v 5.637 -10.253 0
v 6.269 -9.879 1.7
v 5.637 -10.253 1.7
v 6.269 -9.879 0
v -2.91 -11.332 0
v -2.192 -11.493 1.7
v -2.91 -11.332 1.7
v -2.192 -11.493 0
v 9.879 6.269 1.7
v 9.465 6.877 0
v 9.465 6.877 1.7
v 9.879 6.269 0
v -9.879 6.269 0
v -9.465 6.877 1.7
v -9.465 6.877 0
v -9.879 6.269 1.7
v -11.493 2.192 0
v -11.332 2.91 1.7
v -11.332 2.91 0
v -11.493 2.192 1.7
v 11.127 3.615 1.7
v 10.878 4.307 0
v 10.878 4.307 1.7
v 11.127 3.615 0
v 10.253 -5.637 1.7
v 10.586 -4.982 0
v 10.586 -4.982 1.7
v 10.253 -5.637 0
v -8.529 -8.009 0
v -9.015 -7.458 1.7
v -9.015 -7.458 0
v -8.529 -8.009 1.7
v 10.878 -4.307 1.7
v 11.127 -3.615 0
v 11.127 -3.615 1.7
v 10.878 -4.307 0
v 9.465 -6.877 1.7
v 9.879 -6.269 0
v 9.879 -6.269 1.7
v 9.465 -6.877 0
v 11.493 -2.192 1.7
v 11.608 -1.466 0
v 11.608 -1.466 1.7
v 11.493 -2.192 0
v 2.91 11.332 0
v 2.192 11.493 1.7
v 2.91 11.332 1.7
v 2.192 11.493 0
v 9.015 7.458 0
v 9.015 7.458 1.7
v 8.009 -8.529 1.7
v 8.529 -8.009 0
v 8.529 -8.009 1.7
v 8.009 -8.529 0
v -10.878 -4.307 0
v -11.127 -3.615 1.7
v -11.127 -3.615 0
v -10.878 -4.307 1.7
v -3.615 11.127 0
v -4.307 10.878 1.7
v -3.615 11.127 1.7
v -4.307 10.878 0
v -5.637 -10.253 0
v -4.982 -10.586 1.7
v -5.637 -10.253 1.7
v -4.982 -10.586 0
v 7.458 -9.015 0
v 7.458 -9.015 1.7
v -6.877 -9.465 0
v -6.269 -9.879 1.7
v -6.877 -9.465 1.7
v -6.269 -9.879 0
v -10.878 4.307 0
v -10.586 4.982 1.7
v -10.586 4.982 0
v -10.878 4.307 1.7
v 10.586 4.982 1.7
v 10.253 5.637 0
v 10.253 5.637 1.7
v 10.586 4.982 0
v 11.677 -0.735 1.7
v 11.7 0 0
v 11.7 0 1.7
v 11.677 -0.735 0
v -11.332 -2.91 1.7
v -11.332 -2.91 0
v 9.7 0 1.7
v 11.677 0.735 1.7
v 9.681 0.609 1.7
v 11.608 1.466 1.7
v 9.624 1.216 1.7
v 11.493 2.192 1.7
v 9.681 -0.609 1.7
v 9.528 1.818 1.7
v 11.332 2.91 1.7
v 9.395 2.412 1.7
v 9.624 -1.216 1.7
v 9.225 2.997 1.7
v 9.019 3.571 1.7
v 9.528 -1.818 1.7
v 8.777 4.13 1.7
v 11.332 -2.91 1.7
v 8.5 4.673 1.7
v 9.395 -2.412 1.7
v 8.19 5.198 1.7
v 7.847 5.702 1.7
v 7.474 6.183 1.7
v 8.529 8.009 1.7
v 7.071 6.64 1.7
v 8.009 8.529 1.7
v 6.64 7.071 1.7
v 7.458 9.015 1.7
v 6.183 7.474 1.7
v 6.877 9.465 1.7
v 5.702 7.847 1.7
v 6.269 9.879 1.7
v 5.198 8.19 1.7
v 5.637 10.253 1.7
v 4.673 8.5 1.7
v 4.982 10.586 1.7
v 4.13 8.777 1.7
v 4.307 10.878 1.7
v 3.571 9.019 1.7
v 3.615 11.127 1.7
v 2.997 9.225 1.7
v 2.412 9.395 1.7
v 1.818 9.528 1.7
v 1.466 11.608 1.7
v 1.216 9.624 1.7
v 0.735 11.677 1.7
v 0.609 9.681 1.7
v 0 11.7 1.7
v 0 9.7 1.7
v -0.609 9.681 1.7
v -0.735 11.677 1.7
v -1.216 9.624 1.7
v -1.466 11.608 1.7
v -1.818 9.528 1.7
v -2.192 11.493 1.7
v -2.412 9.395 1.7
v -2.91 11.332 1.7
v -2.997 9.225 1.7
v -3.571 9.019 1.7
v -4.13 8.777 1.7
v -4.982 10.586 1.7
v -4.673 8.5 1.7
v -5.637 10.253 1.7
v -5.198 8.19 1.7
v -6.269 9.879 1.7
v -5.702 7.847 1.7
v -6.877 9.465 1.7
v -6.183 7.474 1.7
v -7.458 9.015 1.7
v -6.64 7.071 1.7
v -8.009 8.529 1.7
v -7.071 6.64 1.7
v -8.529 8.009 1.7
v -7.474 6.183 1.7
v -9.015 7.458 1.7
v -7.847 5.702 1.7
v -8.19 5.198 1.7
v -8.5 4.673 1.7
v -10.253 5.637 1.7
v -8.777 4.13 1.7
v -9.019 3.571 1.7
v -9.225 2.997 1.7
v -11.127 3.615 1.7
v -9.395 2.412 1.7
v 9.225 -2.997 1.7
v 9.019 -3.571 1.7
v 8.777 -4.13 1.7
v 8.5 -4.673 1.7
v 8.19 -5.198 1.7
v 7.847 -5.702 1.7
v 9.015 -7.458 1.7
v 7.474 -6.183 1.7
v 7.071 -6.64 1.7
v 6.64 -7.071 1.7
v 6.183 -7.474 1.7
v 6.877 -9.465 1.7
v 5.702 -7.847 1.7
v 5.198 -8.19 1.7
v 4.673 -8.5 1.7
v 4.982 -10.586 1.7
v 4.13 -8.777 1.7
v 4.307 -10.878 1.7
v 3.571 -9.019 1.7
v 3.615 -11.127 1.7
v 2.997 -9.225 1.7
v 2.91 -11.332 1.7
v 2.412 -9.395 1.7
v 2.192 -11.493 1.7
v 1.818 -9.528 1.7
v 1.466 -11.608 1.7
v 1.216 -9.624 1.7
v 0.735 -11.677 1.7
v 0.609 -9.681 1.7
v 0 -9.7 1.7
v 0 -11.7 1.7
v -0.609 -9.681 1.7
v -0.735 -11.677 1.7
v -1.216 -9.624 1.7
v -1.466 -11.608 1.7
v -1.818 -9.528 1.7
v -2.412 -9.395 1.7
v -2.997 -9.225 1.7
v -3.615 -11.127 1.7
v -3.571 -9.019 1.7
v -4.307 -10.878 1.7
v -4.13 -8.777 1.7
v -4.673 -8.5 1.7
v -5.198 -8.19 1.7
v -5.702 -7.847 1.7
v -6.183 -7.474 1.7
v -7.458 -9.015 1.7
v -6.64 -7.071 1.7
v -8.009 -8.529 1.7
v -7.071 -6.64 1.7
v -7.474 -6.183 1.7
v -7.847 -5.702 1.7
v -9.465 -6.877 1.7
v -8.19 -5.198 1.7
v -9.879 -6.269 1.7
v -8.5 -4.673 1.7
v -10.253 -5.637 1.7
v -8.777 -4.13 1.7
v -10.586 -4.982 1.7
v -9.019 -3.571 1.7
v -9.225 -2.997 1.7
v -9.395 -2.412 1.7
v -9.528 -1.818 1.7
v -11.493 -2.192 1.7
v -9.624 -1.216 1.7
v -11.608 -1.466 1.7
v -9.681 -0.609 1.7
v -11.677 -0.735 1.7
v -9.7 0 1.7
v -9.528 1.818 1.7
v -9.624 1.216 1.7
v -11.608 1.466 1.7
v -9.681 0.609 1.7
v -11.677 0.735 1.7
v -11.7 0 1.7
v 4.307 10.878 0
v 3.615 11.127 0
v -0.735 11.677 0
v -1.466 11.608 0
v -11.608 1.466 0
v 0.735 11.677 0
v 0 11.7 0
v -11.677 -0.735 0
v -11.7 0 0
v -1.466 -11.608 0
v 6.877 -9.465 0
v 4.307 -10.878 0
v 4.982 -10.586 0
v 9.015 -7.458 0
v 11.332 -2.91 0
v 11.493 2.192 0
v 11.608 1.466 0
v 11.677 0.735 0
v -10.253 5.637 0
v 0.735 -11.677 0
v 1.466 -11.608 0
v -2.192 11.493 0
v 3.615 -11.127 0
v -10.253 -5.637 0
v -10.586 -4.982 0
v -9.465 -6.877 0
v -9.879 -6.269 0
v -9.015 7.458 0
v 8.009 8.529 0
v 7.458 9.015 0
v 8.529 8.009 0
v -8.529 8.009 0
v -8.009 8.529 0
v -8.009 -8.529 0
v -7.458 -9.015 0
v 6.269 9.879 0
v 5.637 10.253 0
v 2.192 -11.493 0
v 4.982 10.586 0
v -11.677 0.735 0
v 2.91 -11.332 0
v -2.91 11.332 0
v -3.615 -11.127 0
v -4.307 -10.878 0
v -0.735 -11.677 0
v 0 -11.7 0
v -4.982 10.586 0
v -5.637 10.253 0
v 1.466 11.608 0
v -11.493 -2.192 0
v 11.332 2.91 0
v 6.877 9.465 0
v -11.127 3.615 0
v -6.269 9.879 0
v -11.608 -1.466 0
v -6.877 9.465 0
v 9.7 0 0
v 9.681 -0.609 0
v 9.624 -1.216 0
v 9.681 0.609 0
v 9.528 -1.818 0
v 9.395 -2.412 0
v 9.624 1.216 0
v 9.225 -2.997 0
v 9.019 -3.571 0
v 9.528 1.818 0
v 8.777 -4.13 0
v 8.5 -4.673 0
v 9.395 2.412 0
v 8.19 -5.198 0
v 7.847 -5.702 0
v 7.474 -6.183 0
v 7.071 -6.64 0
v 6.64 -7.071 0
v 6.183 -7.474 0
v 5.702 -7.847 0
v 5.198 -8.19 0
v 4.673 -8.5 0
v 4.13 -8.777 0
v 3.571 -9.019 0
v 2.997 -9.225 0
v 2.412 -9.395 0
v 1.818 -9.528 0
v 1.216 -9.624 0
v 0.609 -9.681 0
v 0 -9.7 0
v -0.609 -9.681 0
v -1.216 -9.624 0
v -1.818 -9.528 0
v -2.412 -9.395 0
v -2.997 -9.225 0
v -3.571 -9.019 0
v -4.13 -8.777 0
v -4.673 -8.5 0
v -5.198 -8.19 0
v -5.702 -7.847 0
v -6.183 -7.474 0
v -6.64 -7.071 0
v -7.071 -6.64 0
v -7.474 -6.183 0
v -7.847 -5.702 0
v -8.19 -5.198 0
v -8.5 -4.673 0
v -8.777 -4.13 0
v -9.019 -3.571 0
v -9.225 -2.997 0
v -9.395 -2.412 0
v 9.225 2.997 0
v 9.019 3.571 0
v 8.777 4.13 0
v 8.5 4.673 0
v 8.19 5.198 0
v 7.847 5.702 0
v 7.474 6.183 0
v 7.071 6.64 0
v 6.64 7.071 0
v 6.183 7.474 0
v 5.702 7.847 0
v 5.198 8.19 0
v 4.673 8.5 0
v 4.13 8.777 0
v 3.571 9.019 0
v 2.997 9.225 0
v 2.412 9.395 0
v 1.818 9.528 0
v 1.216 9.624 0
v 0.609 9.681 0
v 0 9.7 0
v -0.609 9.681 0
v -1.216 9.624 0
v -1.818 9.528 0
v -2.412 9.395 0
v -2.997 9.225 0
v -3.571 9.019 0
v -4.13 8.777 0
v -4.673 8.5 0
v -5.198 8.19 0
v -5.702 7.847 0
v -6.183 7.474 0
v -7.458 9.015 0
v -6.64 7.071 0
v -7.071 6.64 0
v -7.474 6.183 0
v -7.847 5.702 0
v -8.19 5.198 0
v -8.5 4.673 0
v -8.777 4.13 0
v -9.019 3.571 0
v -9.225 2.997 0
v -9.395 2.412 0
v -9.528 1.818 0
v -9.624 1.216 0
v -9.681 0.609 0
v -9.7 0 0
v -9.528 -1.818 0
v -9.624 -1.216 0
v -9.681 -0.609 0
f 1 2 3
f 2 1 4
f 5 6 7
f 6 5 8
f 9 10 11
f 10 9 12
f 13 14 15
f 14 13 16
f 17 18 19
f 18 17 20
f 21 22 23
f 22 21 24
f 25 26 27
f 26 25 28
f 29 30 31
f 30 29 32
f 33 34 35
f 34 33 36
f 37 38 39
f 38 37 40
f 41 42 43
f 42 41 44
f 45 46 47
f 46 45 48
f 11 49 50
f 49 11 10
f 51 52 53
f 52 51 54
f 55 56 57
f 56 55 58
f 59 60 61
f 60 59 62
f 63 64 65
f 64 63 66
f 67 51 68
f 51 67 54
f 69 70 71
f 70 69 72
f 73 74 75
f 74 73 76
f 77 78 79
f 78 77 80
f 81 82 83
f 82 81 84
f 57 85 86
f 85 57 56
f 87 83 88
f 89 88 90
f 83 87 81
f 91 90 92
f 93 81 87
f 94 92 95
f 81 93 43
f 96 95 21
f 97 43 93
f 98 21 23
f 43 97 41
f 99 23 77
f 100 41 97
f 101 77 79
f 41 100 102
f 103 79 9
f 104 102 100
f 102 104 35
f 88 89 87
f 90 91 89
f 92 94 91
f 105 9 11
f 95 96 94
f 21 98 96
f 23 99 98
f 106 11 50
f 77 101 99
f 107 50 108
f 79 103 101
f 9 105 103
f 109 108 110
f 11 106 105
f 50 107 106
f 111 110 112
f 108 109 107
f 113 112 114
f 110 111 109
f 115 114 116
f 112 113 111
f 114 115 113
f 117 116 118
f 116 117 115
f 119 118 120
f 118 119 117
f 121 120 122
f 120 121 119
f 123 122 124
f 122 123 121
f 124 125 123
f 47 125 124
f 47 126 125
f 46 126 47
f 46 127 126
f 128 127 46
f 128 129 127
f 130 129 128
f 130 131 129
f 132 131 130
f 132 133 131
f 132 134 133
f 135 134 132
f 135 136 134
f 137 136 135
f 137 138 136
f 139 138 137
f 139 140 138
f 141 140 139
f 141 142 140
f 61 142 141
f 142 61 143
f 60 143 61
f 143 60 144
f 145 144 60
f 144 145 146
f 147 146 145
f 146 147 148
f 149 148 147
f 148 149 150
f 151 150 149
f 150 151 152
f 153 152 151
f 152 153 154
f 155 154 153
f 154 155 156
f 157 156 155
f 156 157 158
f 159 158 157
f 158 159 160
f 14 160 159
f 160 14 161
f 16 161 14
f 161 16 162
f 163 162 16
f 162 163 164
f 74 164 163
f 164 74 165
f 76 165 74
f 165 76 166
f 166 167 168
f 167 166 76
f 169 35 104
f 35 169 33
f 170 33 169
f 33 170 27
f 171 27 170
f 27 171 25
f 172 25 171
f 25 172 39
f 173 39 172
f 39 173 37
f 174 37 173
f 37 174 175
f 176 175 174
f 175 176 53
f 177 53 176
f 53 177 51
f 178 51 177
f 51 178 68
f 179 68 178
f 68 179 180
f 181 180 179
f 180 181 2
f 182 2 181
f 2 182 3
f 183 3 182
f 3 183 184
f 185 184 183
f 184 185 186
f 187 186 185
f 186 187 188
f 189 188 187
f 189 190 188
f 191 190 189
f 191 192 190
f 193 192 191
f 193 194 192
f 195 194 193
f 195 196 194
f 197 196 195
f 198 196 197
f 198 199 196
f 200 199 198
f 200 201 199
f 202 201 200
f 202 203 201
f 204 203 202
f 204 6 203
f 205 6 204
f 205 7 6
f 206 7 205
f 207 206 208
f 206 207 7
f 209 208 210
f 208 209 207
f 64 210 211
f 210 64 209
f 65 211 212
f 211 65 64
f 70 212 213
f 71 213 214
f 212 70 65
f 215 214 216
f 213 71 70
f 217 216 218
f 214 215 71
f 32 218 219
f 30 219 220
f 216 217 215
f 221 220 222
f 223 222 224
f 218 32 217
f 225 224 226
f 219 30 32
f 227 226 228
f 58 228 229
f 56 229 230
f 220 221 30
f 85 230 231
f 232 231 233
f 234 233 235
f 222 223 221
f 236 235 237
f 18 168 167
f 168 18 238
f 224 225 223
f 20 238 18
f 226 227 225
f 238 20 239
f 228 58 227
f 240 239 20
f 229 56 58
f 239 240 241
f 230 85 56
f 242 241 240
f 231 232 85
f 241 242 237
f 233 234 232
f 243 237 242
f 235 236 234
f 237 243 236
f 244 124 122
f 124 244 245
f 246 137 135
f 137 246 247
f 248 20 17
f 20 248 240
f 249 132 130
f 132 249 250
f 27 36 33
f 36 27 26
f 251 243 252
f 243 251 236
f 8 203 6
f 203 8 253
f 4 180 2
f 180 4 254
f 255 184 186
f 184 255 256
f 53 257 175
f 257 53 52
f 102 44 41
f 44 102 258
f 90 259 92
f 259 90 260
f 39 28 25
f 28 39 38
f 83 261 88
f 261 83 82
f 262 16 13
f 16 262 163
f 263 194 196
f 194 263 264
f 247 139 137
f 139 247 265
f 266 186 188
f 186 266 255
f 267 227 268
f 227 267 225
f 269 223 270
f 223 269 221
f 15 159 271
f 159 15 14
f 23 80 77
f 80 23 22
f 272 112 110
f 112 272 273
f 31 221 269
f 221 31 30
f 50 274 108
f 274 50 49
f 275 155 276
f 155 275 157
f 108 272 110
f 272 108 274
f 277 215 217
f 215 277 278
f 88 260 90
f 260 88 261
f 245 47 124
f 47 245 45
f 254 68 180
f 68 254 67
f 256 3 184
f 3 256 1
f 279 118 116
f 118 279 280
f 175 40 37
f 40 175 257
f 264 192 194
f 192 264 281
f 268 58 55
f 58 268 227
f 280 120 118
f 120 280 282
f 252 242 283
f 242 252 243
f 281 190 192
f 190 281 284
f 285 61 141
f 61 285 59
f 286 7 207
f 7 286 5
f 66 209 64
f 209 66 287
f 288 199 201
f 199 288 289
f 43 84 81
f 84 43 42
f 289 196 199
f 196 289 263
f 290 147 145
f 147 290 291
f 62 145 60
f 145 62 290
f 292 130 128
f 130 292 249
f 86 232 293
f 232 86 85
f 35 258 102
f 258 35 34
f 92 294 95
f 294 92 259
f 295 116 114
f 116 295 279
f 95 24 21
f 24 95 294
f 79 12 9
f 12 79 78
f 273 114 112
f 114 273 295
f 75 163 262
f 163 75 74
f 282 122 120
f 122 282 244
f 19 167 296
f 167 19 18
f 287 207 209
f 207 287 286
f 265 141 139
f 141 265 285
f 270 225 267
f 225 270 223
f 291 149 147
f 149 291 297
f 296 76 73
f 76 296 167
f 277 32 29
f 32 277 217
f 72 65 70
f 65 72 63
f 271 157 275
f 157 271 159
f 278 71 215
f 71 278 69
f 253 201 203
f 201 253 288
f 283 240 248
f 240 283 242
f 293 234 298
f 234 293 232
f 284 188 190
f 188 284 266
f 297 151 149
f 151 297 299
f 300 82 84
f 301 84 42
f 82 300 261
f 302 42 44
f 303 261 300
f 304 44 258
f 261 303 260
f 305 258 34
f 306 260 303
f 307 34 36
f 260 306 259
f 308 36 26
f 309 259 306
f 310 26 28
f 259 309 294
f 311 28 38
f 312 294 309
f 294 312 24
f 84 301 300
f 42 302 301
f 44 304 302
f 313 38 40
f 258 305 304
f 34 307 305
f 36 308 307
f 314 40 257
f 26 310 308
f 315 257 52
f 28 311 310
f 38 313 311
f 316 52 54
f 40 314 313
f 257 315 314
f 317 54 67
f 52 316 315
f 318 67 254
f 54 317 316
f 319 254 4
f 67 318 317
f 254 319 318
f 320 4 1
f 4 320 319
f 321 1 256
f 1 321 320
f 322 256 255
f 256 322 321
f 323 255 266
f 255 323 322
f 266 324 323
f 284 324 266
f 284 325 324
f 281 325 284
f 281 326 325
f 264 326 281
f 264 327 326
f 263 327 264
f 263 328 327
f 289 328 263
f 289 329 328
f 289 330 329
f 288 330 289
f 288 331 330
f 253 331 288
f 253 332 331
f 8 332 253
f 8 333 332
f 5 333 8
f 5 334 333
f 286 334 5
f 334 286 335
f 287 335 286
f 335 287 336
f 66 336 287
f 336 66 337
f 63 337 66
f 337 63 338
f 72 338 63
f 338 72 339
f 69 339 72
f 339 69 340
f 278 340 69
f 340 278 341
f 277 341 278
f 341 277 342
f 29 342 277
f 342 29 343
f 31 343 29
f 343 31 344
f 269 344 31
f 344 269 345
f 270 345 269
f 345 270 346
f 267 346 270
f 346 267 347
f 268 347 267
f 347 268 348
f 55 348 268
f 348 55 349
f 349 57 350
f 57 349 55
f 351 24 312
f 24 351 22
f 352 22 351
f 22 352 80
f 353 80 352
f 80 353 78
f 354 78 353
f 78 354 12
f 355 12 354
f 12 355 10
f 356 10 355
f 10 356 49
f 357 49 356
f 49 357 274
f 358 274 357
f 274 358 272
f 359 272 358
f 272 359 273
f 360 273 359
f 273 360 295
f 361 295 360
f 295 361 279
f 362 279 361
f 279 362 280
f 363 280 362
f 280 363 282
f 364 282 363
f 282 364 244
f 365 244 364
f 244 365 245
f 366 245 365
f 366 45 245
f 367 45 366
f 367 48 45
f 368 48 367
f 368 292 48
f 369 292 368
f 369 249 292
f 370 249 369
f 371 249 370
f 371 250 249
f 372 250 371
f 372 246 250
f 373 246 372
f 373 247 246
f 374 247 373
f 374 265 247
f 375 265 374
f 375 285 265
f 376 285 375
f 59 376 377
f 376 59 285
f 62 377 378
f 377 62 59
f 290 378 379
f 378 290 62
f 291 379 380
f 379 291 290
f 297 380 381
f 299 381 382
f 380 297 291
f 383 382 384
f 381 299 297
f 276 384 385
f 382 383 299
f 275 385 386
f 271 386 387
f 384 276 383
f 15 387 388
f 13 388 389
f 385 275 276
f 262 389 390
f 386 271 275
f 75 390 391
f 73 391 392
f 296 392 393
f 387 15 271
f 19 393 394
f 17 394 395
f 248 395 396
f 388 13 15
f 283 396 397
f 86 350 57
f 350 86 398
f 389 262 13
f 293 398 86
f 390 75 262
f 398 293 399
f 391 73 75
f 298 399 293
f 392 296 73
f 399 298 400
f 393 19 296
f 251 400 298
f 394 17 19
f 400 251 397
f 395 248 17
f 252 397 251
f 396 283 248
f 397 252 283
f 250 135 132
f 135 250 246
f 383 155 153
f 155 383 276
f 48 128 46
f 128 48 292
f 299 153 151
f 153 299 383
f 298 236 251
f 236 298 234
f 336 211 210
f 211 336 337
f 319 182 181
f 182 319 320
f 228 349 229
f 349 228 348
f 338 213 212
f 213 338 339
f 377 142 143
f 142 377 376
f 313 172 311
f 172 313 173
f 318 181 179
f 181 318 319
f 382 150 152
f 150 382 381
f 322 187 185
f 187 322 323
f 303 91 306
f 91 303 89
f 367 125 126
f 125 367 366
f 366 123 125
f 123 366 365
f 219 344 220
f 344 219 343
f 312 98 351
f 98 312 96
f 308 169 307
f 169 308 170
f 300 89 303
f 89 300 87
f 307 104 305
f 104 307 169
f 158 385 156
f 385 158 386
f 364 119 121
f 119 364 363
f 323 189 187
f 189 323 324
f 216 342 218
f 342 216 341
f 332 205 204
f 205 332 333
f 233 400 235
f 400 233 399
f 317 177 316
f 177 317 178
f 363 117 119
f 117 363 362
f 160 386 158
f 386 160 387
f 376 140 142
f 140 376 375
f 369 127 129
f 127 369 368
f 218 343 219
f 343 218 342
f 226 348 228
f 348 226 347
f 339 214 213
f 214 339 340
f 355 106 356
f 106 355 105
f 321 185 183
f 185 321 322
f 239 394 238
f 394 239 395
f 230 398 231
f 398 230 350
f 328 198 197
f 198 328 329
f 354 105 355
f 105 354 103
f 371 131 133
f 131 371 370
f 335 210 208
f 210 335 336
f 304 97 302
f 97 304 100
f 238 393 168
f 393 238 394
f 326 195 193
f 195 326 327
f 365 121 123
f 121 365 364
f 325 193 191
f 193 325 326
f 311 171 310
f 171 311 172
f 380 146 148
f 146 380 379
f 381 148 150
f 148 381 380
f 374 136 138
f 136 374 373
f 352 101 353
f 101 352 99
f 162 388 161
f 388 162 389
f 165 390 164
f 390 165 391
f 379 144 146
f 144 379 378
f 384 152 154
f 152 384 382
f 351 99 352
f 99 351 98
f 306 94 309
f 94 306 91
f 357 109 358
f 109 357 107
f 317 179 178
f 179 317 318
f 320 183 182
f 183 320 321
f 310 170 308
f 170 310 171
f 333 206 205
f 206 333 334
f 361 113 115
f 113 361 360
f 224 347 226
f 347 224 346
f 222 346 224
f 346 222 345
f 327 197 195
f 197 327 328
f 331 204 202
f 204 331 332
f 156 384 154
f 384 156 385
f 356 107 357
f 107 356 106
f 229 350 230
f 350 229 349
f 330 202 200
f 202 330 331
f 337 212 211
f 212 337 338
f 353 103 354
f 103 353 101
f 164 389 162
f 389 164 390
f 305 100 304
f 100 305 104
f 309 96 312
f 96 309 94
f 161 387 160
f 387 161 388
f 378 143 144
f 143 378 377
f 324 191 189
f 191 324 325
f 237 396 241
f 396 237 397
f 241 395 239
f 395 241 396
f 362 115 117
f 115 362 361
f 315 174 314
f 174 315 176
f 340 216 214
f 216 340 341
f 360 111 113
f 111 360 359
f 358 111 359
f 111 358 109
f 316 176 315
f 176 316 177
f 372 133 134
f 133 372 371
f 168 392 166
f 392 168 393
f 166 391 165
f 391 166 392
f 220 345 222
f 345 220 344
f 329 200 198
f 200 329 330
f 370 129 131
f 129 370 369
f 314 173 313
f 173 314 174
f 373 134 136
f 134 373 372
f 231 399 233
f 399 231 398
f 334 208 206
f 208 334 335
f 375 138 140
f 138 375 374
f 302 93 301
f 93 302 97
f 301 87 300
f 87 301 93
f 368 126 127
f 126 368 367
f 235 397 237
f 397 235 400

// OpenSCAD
RS = 25/2; // mm - outer size of start (fits the car)
RE = 28; // mm - outer size of the end
WL = 1.4; //mm - default wall thickness 

H1=45;
H2=70;
$fn=100;


module cyl2(r, rot=[0,0,0], trans=[0,0,0]) {
    rotate(rot) 
        linear_extrude(height=0.1) 
            translate(trans)
                circle(r=r);
}


//makes a tube between a and b
module tube(
ra, // first radius  
rb, // second radius
h, // height
wa = WL, // wall thickness at a
wb= WL, // wall thickness at b
rota=[0,0,0], transa=[0,0,0], // rotate and translate a
rotb=[0,0,0], transb=[0,0,0], // rotate and translate b
){

    difference(){
        //outer
        hull(){
            cyl2(ra, rota, transa);
            translate([0,0,h]) cyl2(rb, rotb, transb);
        }
        // innter
        hull(){
            translate([0,0,-0.0001]) cyl2(ra-wa, rota, transa);
            translate([0,0,h+0.0001]) cyl2(rb-wb, rotb, transb);
        }
    }
}


// demo
//tube(ra=10, rb=10,h=10);
//tube(ra=10, rb=10,h=10, rota=[-20,-20,0],rotb=[20,20,0]);
//tube(ra=20, rb=10,h=10, wb=3, transb=[0,-10,0]); //ra-rb

module filter() {
    color("red")
    tube(ra=RS+2-2*WL,rb=RS+2-2*WL, wa=2,wb=2, h=1.6);
}


module funel(){
    // bottom part
    translate([0,0,-H1]) tube(ra=RS,rb=RS,h=H1);

    
    //middle part 
 
    translate([0,0,-3]) tube(ra=RS, rb=RS+2, wb=3*WL, h=3);

    
    // top part
    tube(ra=RS+2,rb=RE, wa=2*WL, h=H2, rotb=[0,30,0], transb=[RE-RS,0,0]);
}


//funel();

//translate([0,0,-2.5]) 
filter();
